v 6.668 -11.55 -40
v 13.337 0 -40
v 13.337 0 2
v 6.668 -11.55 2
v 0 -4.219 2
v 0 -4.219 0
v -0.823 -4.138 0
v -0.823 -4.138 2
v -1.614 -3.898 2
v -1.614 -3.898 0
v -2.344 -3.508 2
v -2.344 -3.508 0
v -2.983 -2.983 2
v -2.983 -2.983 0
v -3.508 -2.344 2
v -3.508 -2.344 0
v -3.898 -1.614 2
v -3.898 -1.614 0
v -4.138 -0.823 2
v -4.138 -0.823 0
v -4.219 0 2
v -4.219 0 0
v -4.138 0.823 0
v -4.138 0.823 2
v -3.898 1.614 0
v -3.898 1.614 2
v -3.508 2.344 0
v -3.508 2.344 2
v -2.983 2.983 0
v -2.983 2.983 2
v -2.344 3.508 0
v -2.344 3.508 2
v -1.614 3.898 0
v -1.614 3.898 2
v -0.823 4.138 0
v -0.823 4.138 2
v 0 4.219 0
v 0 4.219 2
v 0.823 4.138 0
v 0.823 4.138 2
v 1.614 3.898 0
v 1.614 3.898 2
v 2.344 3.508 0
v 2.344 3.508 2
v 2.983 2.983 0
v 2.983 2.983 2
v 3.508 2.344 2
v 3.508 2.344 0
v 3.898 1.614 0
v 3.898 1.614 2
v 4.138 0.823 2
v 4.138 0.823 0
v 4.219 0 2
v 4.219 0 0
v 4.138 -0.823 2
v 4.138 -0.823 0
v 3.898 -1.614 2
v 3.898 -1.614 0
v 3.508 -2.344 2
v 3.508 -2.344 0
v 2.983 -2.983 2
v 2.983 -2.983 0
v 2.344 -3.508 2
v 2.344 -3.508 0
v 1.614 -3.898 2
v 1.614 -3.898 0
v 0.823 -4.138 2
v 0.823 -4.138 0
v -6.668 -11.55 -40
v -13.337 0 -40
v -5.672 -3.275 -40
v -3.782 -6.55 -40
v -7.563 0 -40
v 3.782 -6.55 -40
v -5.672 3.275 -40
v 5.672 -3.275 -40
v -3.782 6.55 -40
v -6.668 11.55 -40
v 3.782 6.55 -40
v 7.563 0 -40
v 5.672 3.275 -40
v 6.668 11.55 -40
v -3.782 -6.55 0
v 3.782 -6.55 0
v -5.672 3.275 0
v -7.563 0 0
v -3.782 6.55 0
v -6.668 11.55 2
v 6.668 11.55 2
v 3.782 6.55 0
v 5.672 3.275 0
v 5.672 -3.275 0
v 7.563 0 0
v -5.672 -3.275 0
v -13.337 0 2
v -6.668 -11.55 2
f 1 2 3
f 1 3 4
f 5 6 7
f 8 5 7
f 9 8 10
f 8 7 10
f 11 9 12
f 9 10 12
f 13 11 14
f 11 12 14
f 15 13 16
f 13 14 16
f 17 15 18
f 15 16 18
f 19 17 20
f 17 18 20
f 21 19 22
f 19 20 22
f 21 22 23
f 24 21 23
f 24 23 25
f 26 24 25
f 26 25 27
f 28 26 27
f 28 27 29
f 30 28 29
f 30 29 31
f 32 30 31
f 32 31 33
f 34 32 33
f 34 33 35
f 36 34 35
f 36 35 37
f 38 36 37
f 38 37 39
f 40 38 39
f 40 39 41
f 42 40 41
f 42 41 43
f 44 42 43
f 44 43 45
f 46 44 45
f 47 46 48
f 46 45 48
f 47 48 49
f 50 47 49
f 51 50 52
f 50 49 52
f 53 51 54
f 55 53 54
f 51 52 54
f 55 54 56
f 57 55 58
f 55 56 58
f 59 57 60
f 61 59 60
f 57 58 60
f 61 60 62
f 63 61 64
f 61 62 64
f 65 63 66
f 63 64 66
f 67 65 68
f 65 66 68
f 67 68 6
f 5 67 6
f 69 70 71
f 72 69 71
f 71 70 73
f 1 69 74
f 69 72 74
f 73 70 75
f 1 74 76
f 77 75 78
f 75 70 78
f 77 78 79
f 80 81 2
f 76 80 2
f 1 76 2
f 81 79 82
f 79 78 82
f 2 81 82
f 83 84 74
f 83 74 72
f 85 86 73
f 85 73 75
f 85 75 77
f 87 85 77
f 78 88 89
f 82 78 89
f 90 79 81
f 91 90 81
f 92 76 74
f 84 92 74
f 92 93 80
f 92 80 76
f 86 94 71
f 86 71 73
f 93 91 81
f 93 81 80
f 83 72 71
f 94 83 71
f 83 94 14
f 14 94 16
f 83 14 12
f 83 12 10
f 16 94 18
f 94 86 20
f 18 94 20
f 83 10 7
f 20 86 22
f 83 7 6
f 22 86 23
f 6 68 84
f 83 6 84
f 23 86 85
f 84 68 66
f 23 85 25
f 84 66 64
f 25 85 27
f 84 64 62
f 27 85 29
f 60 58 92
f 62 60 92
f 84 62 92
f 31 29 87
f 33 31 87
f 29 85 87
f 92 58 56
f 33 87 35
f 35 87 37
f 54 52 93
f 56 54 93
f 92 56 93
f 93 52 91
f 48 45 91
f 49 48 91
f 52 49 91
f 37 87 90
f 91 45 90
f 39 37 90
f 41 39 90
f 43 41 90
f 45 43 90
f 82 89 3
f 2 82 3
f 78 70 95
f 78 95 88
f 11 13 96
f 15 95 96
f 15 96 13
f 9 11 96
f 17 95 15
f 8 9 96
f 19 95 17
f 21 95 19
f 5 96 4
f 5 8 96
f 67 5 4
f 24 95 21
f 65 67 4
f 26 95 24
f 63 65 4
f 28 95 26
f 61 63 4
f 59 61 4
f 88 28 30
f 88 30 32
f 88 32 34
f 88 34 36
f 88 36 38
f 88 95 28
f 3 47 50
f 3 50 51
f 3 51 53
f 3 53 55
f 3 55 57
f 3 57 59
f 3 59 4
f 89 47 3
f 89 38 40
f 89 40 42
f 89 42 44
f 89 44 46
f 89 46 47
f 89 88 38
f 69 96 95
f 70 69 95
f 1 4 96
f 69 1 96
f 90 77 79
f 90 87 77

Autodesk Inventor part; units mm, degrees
ref_plane "YZ Plane" through (0, 0, 0) normal (1, 0, 0) x (0, 1, 0)
ref_plane "XZ Plane" through (0, 0, 0) normal (0, 1, 0) x (-1, 0, 0)
ref_plane "XY Plane" through (0, 0, 0) normal (0, 0, 1) x (1, 0, 0)
sketch "Sketch1" plane through (0, 0, 0) normal (0, 0, 1) x (1, 0, 0)
  line L0 (5.4993, 3.175) -> (7.3323, 0)
  line L1 (0, 6.35) -> (3.6662, 6.35)
  line L2 (3.6662, 6.35) -> (5.4993, 3.175)
  line L3 (7.3323, 0) -> (5.4993, -3.175)
  line L4 (5.4993, -3.175) -> (3.6662, -6.35)
  line L5 (3.6662, -6.35) -> (0, -6.35)
  line L6 (0, -6.35) -> (-3.6662, -6.35)
  line L7 (-3.6662, -6.35) -> (-5.4993, -3.175)
  line L8 (-5.4993, -3.175) -> (-7.3323, 0)
  line L9 (-7.3323, 0) -> (-5.4993, 3.175)
  line L10 (-5.4993, 3.175) -> (-3.6662, 6.35)
  line L11 (-3.6662, 6.35) -> (0, 6.35)
  line L12 (5.6725, 3.275) -> (7.5633, 0)
  line L13 (7.5633, 0) -> (5.6725, -3.275)
  line L14 (5.6725, -3.275) -> (3.7816, -6.55)
  line L15 (3.7816, -6.55) -> (0, -6.55)
  line L16 (0, -6.55) -> (-3.7816, -6.55)
  line L17 (-3.7816, -6.55) -> (-5.6725, -3.275)
  line L18 (-5.6725, -3.275) -> (-7.5633, 0)
  line L19 (-7.5633, 0) -> (-5.6725, 3.275)
  line L20 (-5.6725, 3.275) -> (-3.7816, 6.55)
  line L21 (-3.7816, 6.55) -> (0, 6.55)
  line L22 (0, 6.55) -> (3.7816, 6.55)
  line L23 (3.7816, 6.55) -> (5.6725, 3.275)
  line L24 (10.0026, 5.775) -> (13.3368, 0)
  line L25 (13.3368, 0) -> (10.0026, -5.775)
  line L26 (10.0026, -5.775) -> (6.6684, -11.55)
  line L27 (6.6684, -11.55) -> (0, -11.55)
  line L28 (0, -11.55) -> (-6.6684, -11.55)
  line L29 (-6.6684, -11.55) -> (-10.0026, -5.775)
  line L30 (-10.0026, -5.775) -> (-13.3368, 0)
  line L31 (-13.3368, 0) -> (-10.0026, 5.775)
  line L32 (-10.0026, 5.775) -> (-6.6684, 11.55)
  line L33 (-6.6684, 11.55) -> (0, 11.55)
  line L34 (0, 11.55) -> (6.6684, 11.55)
  line L35 (6.6684, 11.55) -> (10.0026, 5.775)
  point P0 (0, 0)
  dimension "d0" = 0.2
  dimension "d1" = 5
extrude "Extrusion1" add sketch "Sketch1" against normal blind 40 contours L24 L25 L26 L27 L28 L29 L30 L31 L32 L33 L34 L35
sketch "Sketch2" plane through (0, 0, 0) normal (0, 0, 1) x (1, 0, 0)
  line L0 (-3.7816, 6.55) -> (3.7816, 6.55) projected
  line L1 (3.7816, 6.55) -> (7.5633, 0) projected
  line L2 (7.5633, 0) -> (3.7816, -6.55) projected
  line L3 (3.7816, -6.55) -> (-3.7816, -6.55) projected
  line L4 (-3.7816, -6.55) -> (-7.5633, 0) projected
  line L5 (-7.5633, 0) -> (-3.7816, 6.55) projected
  line L6 (6.6684, 11.55) -> (13.3368, 0) projected
  line L7 (-6.6684, 11.55) -> (6.6684, 11.55) projected
  line L8 (-13.3368, 0) -> (-6.6684, 11.55) projected
  line L9 (-6.6684, -11.55) -> (-13.3368, 0) projected
  line L10 (6.6684, -11.55) -> (-6.6684, -11.55) projected
  line L11 (13.3368, 0) -> (6.6684, -11.55) projected
  point P0 (0, 0)
extrude "Extrusion2" add sketch "Sketch2" along normal blind 2 contours L0 L1 L2 L3 L4 L5 | L6 L11 L10 L9 L8 L7
sketch "Sketch3" plane through (0, 0, 2) normal (0, 0, 1) x (1, 0, 0)
  point P0 (0, 0)
  point P1 (0, 0)
hole "Hole1" at (0, 0, 2) direction (0, 0, -1) diameter 8.4375 end through all
properties part number "AntiBacklash" material "ABS Plastic"
